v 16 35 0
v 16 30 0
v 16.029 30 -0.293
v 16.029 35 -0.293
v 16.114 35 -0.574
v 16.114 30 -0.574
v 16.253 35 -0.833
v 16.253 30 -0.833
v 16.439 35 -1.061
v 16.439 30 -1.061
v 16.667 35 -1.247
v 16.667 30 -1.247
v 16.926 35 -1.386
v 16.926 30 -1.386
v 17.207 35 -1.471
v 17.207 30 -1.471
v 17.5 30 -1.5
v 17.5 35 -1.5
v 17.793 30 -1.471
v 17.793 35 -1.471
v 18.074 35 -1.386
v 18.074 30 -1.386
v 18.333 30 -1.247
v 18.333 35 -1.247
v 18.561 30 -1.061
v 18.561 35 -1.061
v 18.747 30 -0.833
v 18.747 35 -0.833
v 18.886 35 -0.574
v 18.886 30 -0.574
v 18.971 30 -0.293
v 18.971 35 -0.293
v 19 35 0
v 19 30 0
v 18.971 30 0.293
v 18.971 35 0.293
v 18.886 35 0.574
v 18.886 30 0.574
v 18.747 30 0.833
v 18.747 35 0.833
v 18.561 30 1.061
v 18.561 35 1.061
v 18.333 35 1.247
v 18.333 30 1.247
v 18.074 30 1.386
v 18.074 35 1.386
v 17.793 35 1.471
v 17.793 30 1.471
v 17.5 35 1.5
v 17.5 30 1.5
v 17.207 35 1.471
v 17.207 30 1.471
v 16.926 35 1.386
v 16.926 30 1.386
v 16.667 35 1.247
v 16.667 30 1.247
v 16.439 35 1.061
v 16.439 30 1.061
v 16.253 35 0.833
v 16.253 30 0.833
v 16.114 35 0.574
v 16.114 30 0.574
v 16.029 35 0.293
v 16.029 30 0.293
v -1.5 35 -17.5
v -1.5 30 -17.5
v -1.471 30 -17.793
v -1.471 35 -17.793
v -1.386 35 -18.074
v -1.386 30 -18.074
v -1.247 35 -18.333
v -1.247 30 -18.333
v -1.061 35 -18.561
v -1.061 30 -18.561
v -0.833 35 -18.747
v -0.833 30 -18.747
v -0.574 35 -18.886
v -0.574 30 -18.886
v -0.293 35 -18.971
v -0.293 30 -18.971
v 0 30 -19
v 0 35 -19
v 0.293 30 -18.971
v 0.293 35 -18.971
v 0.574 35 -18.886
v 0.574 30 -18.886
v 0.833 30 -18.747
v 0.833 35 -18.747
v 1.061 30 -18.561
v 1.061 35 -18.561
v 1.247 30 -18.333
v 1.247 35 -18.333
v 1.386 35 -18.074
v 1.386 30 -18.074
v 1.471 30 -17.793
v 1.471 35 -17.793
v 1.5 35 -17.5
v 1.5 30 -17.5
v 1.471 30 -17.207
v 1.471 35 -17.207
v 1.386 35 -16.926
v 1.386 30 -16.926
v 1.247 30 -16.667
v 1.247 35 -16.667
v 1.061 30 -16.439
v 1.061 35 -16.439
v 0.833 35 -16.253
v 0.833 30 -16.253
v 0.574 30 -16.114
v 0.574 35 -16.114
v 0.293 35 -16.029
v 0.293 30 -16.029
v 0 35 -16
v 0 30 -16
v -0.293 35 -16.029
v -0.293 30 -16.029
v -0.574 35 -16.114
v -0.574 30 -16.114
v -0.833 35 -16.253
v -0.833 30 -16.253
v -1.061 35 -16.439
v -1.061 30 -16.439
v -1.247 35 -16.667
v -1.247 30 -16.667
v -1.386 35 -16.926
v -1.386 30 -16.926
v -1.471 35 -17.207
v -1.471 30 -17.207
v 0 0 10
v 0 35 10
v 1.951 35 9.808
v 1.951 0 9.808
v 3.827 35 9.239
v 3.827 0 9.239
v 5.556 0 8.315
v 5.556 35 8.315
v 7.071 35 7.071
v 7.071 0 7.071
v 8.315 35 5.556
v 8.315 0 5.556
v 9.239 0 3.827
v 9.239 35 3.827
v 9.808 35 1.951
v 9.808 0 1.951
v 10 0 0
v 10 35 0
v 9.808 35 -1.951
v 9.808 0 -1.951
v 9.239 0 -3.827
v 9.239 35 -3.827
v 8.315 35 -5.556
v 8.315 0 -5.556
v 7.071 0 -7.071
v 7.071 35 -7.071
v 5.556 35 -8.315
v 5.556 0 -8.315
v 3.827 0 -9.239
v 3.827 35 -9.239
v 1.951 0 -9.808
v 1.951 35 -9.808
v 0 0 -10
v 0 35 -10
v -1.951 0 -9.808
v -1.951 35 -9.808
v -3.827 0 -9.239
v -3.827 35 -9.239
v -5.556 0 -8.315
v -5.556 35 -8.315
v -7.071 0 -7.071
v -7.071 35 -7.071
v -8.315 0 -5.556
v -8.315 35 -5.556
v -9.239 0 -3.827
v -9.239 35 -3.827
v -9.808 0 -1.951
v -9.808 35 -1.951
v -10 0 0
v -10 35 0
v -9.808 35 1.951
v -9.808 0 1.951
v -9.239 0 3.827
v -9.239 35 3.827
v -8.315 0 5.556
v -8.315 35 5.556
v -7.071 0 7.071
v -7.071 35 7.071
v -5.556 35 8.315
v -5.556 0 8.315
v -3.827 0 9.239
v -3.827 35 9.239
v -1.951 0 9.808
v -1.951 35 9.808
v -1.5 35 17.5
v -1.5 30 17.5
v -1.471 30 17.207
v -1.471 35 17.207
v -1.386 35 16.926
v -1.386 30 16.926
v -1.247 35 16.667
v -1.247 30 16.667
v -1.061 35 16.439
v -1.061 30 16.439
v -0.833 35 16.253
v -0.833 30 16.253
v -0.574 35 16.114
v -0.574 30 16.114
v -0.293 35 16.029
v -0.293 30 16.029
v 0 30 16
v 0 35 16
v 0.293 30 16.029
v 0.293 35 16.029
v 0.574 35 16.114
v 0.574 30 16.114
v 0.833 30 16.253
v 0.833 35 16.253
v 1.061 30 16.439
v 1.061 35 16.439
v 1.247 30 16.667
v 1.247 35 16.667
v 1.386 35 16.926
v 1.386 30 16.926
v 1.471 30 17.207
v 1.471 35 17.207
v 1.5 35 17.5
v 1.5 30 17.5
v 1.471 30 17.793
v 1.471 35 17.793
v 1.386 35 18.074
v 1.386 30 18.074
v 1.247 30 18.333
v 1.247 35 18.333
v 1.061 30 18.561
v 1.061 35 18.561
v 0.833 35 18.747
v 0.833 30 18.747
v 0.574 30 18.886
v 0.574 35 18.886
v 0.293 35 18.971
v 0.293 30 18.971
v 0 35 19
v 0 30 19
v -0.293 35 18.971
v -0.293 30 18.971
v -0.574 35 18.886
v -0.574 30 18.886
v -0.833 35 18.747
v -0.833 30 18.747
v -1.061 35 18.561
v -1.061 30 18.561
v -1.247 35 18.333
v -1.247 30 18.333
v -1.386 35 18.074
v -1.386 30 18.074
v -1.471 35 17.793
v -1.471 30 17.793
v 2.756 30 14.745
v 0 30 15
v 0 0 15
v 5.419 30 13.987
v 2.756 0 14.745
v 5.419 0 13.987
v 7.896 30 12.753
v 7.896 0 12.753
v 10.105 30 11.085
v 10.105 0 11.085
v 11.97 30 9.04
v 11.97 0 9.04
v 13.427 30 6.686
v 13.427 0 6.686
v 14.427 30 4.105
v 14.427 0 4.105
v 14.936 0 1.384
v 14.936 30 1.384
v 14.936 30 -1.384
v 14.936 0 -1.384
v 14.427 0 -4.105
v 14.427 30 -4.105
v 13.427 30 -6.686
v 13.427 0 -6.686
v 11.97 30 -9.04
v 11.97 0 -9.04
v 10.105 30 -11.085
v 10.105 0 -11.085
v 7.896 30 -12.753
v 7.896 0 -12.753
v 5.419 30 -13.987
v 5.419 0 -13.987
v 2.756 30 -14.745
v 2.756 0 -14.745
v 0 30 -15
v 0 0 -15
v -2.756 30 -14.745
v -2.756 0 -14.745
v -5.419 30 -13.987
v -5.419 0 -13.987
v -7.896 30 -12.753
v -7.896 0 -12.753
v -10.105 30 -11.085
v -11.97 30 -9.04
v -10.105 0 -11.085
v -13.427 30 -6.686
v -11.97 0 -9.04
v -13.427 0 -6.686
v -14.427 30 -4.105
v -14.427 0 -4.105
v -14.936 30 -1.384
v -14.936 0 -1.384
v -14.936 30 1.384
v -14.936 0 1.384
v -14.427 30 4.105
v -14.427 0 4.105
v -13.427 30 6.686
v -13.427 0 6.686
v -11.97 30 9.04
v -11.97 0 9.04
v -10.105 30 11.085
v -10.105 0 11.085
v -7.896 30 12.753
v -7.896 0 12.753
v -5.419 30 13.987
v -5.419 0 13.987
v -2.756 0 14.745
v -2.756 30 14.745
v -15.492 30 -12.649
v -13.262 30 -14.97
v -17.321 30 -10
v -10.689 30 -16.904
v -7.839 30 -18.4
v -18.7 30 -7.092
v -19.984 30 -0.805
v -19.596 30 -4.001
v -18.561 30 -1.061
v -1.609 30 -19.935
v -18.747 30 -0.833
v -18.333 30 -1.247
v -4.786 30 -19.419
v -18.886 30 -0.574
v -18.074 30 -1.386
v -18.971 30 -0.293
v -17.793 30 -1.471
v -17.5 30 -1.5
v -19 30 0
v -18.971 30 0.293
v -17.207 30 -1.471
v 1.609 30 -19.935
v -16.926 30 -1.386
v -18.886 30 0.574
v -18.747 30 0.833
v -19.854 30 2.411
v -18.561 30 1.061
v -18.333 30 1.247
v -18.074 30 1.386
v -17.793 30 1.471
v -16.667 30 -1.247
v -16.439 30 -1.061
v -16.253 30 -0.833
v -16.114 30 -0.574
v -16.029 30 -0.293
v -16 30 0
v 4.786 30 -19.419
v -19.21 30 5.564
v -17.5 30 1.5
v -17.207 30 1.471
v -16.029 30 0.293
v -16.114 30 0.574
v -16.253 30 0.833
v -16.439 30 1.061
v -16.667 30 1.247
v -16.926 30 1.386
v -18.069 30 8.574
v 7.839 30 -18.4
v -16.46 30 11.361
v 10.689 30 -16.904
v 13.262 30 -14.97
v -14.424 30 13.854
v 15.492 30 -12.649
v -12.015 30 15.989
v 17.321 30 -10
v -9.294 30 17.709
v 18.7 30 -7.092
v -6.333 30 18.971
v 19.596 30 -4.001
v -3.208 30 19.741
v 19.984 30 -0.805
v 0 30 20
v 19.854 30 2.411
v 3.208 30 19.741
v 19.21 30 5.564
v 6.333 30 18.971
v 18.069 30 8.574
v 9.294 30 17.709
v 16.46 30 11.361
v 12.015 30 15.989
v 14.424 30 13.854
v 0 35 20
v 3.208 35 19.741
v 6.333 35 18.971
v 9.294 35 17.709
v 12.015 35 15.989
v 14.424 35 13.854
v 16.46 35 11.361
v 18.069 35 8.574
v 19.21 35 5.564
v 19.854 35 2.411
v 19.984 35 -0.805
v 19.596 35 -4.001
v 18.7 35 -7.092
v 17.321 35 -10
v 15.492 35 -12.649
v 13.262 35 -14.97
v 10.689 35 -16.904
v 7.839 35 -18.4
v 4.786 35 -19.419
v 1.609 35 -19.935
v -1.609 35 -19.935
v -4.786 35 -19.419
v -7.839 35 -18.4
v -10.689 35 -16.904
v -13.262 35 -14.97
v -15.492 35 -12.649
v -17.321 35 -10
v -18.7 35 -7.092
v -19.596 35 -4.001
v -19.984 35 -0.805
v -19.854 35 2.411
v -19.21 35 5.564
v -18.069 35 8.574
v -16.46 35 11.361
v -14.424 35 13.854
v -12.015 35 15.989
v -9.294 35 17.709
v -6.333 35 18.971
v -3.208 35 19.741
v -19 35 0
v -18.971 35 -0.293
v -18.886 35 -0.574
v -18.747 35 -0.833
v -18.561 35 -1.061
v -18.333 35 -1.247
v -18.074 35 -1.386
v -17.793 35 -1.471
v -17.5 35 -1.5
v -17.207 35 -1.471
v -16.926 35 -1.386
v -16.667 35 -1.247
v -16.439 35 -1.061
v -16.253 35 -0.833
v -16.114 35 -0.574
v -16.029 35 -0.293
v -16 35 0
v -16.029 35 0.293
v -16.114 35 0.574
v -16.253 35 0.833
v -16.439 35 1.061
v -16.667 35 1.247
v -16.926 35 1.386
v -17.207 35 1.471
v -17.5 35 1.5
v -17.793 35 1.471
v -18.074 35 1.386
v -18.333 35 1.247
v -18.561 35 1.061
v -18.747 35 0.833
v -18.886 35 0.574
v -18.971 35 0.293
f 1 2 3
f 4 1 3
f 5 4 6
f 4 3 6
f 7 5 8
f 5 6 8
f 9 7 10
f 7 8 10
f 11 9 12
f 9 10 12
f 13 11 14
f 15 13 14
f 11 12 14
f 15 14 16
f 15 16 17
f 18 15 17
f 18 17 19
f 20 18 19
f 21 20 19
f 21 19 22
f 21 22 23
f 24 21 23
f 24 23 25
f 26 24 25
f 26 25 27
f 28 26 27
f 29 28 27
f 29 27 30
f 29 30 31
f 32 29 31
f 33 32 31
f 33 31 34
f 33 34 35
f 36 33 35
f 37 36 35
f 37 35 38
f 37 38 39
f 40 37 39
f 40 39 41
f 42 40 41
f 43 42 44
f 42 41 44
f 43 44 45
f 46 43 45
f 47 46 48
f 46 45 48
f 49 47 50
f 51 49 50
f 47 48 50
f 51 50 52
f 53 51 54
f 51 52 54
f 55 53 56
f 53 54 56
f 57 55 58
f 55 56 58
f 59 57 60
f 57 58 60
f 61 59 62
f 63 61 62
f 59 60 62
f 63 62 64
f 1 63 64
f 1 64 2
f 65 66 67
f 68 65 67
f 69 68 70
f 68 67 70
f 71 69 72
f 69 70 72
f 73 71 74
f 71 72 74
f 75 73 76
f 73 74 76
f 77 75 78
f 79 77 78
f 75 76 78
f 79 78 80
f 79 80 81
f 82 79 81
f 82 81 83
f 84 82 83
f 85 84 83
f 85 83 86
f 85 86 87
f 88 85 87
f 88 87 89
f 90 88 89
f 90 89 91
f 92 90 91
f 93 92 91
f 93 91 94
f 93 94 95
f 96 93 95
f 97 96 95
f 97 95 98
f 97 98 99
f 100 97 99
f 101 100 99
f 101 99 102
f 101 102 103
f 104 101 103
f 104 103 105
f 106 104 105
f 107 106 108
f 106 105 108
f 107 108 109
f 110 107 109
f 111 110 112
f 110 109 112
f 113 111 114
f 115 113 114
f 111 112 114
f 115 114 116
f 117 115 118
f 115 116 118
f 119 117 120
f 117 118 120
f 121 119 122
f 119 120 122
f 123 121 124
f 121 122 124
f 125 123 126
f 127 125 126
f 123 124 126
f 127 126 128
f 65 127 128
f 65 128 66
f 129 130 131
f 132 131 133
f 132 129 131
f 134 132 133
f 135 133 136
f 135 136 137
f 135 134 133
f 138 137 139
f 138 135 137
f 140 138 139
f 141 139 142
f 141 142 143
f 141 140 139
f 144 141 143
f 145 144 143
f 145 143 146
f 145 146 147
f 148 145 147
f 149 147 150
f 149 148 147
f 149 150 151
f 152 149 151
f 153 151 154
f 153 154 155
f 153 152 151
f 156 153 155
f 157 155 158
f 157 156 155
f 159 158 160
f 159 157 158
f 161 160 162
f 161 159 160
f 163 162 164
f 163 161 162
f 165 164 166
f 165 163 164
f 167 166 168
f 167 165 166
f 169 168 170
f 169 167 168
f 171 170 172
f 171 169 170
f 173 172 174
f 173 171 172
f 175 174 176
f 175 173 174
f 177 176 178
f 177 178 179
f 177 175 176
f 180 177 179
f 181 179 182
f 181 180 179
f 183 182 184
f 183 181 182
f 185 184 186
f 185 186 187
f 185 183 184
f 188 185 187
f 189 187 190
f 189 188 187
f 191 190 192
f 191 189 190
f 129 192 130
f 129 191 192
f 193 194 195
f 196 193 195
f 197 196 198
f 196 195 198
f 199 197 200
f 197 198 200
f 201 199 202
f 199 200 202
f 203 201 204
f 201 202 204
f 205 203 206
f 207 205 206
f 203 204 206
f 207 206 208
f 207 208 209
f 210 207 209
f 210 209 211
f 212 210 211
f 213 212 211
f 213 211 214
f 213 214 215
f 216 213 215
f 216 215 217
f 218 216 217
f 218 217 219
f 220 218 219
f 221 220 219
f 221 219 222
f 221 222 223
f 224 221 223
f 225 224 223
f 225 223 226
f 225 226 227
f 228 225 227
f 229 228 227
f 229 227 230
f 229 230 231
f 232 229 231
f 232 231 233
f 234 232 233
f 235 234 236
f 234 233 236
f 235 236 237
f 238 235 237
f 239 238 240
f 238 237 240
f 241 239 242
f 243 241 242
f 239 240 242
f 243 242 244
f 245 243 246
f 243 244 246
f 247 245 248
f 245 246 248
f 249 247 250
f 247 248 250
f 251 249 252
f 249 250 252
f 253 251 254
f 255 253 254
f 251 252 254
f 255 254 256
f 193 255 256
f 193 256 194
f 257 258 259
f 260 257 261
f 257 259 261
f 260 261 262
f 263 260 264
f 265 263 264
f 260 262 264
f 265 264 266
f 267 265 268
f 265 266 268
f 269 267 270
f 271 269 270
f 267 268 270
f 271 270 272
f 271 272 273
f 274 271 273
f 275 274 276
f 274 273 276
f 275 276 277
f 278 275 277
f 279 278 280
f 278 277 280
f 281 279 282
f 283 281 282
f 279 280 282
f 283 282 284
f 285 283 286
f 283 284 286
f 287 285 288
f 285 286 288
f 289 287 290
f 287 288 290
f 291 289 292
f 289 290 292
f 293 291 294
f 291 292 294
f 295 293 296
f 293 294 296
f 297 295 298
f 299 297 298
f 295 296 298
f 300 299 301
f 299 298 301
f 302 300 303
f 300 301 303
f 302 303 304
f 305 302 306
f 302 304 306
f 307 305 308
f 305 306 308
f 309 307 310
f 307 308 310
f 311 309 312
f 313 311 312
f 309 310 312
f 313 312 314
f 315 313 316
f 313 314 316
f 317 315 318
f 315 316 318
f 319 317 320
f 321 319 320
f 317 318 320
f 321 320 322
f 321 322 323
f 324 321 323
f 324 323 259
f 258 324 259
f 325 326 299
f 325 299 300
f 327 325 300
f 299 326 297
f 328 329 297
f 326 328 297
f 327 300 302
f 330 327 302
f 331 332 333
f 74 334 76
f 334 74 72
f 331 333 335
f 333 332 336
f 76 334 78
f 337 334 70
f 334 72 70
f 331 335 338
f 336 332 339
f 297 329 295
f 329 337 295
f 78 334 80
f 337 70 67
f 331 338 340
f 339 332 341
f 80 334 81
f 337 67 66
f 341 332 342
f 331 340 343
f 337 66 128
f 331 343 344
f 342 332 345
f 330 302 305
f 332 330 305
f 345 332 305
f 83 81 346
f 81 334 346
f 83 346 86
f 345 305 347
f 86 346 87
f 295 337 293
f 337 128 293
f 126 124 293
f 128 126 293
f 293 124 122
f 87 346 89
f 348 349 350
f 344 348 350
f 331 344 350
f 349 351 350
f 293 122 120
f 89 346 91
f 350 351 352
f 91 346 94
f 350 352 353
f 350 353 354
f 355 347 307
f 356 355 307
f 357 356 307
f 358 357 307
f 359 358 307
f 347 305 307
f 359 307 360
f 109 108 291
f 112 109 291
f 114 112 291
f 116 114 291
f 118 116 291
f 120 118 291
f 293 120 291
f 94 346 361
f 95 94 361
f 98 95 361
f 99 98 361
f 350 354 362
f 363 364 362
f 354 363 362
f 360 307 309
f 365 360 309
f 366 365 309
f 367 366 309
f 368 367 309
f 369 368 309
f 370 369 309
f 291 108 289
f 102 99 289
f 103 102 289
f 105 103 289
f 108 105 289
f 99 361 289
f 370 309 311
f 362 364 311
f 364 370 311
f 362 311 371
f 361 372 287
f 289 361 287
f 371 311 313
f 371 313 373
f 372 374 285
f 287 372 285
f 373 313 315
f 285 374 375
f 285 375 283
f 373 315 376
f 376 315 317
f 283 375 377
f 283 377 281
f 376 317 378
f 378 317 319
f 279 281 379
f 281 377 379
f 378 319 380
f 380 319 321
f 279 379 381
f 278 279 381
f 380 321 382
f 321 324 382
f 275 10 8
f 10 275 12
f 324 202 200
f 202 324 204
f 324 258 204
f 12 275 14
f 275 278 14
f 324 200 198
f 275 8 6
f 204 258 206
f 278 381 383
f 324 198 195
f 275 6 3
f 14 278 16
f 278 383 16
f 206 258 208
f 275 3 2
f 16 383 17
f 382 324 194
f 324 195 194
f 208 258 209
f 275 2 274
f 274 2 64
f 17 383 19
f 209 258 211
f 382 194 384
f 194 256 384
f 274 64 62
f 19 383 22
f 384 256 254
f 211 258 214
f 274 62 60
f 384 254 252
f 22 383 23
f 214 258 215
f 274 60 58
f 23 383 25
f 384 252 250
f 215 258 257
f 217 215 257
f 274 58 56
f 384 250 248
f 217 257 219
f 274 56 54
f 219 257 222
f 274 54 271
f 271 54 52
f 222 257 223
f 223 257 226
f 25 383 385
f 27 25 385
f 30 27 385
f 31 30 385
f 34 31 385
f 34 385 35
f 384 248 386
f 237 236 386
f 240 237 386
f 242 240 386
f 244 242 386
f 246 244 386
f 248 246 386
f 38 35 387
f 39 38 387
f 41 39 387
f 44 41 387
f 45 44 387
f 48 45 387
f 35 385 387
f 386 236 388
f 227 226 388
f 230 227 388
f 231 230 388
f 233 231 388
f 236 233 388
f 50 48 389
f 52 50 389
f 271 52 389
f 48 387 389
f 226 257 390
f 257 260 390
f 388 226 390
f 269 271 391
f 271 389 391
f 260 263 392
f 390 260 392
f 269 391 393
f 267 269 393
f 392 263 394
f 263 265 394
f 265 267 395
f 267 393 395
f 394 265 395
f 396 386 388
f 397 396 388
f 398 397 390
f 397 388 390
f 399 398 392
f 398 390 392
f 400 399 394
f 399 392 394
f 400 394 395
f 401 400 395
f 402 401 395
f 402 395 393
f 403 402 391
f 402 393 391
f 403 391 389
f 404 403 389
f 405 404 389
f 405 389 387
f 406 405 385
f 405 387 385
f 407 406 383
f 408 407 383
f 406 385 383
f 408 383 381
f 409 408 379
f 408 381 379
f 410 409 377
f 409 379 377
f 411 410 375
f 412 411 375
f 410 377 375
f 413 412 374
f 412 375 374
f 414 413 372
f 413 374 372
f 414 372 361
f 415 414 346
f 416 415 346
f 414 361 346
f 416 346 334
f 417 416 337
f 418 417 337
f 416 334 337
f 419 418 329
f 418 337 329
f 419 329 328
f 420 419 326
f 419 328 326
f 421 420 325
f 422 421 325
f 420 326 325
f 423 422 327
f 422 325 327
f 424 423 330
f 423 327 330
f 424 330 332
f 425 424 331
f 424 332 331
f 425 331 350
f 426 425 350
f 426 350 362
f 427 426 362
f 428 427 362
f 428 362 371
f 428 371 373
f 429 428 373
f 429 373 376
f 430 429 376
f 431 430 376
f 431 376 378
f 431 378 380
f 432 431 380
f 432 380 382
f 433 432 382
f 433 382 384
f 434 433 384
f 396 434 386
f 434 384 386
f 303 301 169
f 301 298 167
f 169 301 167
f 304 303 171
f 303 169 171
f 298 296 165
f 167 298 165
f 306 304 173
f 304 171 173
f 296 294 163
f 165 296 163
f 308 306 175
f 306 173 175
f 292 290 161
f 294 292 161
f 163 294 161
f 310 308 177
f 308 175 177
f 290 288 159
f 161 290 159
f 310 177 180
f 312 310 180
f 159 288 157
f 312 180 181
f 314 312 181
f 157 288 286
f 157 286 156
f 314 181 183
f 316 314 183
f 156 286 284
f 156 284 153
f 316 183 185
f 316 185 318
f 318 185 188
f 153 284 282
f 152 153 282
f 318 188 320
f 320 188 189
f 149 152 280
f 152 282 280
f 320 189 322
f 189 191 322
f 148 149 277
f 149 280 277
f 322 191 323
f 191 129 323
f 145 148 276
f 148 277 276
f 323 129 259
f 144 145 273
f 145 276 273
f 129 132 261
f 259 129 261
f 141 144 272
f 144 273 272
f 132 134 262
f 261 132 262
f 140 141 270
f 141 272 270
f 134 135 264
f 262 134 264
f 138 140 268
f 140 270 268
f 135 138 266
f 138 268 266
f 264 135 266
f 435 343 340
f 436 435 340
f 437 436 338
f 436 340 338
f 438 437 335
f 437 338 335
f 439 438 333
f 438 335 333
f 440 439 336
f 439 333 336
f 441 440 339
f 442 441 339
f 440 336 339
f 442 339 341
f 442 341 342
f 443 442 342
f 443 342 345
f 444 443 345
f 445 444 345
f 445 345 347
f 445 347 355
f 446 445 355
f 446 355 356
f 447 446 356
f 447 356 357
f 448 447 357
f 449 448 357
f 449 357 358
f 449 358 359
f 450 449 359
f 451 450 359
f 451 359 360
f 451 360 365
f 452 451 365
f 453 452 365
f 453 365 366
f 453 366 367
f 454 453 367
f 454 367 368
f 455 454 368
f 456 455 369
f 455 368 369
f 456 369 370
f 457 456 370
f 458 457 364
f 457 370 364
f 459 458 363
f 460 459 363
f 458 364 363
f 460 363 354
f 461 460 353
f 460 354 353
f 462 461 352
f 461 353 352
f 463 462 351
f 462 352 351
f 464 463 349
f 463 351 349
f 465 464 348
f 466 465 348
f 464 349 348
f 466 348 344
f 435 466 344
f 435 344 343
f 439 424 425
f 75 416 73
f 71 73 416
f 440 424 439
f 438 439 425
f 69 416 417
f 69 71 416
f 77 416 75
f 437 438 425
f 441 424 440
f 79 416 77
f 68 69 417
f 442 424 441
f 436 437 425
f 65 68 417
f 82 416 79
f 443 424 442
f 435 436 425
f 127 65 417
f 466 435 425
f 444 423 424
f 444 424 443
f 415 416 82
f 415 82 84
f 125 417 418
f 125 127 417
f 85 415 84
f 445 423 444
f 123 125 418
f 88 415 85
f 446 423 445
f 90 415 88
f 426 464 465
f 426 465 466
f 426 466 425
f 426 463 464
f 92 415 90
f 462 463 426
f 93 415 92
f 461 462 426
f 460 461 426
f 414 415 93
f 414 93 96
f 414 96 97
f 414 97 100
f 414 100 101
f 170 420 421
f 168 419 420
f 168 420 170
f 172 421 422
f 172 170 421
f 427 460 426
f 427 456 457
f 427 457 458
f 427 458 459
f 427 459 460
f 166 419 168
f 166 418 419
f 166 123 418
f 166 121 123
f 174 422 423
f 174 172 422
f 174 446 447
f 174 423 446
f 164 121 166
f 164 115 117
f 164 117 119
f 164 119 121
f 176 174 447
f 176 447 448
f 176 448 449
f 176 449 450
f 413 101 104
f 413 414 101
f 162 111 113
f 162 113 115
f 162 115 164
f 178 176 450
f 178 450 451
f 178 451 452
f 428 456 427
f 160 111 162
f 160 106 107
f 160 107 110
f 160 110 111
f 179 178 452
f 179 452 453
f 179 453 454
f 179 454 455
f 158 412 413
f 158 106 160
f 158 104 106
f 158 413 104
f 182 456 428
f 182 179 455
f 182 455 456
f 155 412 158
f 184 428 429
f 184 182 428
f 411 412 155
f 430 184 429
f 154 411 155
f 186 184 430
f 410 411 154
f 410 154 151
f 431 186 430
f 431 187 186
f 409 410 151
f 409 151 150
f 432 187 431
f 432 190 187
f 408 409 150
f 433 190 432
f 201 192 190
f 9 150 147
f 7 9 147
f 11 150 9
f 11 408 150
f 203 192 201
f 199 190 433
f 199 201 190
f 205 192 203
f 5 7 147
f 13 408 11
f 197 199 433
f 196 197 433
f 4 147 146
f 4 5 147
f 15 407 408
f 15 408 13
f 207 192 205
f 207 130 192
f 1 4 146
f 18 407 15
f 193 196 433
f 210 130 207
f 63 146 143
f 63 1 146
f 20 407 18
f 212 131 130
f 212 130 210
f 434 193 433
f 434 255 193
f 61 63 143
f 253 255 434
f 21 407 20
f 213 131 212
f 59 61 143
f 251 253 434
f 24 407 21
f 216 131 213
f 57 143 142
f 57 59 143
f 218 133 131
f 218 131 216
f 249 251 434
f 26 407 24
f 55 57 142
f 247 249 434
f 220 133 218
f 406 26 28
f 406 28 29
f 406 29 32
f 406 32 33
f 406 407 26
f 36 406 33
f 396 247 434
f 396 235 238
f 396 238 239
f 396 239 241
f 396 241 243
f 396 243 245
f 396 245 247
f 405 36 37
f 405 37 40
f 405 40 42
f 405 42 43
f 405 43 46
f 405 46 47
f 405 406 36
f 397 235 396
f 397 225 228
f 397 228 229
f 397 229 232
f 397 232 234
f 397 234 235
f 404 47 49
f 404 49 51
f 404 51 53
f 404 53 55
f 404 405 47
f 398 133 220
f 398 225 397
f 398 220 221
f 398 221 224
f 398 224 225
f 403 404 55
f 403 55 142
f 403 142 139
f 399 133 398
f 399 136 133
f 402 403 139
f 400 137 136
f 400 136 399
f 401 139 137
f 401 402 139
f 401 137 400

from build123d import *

# Parameters (mm, degrees)
SKETCH_1_R      = 15
SKETCH_1_R_2    = 10
EXTRUDE_1_DEPTH = 30
SKETCH_2_R      = 20
SKETCH_2_R_2    = 15
SKETCH_2_R_3    = 10
EXTRUDE_2_DEPTH = 5
F_3_0MM_1_D     = 3
F_3_0MM_1_DEPTH = 7.5
F_3_0MM_1_TIP   = 0.901290929


with BuildPart() as part:
    # 草图1 → 凸台-拉伸1 (new body)
    with BuildSketch(Plane(origin=(0, 0, 0), x_dir=(1, 0, 0), z_dir=(0, 1, 0))):
        with Locations(Location((0, 0, 0), (0, 0, 270))):
            Circle(SKETCH_1_R)
        with Locations(Location((0, 0, 0), (0, 0, 270))):
            Circle(SKETCH_1_R_2, mode=Mode.SUBTRACT)
    extrude(amount=EXTRUDE_1_DEPTH)

    # 草图2 → 凸台-拉伸2 (add)
    # profile 1 of 2: a face of its own
    with BuildSketch(Plane(origin=(0, 30, 0), x_dir=(1, 0, 0), z_dir=(0, 1, 0))):
        with Locations(Location((0, 0, 0), (0, 0, 270))):
            Circle(SKETCH_2_R)
        with Locations(Location((0, 0, 0), (0, 0, 270))):
            Circle(SKETCH_2_R_2, mode=Mode.SUBTRACT)
    # profile 2 of 2: a face of its own
    with BuildSketch(Plane(origin=(0, 30, 0), x_dir=(1, 0, 0), z_dir=(0, 1, 0))):
        with Locations(Location((0, 0, 0), (0, 0, 270))):
            Circle(SKETCH_2_R_2)
        with Locations(Location((0, 0, 0), (0, 0, 270))):
            Circle(SKETCH_2_R_3, mode=Mode.SUBTRACT)
    extrude(amount=EXTRUDE_2_DEPTH)

    # Ø3.0mm 暗销孔1
    with Locations(Plane(origin=(0, 35, 0), x_dir=(1, 0, 0), z_dir=(0, 1, 0))):
        with Locations((0, 17.5), (17.5, 0), (0, -17.5), (-17.5, 0)):
            Hole(F_3_0MM_1_D / 2, depth=F_3_0MM_1_DEPTH)
            with Locations((0, 0, -(F_3_0MM_1_DEPTH + F_3_0MM_1_TIP / 2))):  # 118° drill point
                Cone(0, F_3_0MM_1_D / 2, F_3_0MM_1_TIP, mode=Mode.SUBTRACT)


solid = part.part
